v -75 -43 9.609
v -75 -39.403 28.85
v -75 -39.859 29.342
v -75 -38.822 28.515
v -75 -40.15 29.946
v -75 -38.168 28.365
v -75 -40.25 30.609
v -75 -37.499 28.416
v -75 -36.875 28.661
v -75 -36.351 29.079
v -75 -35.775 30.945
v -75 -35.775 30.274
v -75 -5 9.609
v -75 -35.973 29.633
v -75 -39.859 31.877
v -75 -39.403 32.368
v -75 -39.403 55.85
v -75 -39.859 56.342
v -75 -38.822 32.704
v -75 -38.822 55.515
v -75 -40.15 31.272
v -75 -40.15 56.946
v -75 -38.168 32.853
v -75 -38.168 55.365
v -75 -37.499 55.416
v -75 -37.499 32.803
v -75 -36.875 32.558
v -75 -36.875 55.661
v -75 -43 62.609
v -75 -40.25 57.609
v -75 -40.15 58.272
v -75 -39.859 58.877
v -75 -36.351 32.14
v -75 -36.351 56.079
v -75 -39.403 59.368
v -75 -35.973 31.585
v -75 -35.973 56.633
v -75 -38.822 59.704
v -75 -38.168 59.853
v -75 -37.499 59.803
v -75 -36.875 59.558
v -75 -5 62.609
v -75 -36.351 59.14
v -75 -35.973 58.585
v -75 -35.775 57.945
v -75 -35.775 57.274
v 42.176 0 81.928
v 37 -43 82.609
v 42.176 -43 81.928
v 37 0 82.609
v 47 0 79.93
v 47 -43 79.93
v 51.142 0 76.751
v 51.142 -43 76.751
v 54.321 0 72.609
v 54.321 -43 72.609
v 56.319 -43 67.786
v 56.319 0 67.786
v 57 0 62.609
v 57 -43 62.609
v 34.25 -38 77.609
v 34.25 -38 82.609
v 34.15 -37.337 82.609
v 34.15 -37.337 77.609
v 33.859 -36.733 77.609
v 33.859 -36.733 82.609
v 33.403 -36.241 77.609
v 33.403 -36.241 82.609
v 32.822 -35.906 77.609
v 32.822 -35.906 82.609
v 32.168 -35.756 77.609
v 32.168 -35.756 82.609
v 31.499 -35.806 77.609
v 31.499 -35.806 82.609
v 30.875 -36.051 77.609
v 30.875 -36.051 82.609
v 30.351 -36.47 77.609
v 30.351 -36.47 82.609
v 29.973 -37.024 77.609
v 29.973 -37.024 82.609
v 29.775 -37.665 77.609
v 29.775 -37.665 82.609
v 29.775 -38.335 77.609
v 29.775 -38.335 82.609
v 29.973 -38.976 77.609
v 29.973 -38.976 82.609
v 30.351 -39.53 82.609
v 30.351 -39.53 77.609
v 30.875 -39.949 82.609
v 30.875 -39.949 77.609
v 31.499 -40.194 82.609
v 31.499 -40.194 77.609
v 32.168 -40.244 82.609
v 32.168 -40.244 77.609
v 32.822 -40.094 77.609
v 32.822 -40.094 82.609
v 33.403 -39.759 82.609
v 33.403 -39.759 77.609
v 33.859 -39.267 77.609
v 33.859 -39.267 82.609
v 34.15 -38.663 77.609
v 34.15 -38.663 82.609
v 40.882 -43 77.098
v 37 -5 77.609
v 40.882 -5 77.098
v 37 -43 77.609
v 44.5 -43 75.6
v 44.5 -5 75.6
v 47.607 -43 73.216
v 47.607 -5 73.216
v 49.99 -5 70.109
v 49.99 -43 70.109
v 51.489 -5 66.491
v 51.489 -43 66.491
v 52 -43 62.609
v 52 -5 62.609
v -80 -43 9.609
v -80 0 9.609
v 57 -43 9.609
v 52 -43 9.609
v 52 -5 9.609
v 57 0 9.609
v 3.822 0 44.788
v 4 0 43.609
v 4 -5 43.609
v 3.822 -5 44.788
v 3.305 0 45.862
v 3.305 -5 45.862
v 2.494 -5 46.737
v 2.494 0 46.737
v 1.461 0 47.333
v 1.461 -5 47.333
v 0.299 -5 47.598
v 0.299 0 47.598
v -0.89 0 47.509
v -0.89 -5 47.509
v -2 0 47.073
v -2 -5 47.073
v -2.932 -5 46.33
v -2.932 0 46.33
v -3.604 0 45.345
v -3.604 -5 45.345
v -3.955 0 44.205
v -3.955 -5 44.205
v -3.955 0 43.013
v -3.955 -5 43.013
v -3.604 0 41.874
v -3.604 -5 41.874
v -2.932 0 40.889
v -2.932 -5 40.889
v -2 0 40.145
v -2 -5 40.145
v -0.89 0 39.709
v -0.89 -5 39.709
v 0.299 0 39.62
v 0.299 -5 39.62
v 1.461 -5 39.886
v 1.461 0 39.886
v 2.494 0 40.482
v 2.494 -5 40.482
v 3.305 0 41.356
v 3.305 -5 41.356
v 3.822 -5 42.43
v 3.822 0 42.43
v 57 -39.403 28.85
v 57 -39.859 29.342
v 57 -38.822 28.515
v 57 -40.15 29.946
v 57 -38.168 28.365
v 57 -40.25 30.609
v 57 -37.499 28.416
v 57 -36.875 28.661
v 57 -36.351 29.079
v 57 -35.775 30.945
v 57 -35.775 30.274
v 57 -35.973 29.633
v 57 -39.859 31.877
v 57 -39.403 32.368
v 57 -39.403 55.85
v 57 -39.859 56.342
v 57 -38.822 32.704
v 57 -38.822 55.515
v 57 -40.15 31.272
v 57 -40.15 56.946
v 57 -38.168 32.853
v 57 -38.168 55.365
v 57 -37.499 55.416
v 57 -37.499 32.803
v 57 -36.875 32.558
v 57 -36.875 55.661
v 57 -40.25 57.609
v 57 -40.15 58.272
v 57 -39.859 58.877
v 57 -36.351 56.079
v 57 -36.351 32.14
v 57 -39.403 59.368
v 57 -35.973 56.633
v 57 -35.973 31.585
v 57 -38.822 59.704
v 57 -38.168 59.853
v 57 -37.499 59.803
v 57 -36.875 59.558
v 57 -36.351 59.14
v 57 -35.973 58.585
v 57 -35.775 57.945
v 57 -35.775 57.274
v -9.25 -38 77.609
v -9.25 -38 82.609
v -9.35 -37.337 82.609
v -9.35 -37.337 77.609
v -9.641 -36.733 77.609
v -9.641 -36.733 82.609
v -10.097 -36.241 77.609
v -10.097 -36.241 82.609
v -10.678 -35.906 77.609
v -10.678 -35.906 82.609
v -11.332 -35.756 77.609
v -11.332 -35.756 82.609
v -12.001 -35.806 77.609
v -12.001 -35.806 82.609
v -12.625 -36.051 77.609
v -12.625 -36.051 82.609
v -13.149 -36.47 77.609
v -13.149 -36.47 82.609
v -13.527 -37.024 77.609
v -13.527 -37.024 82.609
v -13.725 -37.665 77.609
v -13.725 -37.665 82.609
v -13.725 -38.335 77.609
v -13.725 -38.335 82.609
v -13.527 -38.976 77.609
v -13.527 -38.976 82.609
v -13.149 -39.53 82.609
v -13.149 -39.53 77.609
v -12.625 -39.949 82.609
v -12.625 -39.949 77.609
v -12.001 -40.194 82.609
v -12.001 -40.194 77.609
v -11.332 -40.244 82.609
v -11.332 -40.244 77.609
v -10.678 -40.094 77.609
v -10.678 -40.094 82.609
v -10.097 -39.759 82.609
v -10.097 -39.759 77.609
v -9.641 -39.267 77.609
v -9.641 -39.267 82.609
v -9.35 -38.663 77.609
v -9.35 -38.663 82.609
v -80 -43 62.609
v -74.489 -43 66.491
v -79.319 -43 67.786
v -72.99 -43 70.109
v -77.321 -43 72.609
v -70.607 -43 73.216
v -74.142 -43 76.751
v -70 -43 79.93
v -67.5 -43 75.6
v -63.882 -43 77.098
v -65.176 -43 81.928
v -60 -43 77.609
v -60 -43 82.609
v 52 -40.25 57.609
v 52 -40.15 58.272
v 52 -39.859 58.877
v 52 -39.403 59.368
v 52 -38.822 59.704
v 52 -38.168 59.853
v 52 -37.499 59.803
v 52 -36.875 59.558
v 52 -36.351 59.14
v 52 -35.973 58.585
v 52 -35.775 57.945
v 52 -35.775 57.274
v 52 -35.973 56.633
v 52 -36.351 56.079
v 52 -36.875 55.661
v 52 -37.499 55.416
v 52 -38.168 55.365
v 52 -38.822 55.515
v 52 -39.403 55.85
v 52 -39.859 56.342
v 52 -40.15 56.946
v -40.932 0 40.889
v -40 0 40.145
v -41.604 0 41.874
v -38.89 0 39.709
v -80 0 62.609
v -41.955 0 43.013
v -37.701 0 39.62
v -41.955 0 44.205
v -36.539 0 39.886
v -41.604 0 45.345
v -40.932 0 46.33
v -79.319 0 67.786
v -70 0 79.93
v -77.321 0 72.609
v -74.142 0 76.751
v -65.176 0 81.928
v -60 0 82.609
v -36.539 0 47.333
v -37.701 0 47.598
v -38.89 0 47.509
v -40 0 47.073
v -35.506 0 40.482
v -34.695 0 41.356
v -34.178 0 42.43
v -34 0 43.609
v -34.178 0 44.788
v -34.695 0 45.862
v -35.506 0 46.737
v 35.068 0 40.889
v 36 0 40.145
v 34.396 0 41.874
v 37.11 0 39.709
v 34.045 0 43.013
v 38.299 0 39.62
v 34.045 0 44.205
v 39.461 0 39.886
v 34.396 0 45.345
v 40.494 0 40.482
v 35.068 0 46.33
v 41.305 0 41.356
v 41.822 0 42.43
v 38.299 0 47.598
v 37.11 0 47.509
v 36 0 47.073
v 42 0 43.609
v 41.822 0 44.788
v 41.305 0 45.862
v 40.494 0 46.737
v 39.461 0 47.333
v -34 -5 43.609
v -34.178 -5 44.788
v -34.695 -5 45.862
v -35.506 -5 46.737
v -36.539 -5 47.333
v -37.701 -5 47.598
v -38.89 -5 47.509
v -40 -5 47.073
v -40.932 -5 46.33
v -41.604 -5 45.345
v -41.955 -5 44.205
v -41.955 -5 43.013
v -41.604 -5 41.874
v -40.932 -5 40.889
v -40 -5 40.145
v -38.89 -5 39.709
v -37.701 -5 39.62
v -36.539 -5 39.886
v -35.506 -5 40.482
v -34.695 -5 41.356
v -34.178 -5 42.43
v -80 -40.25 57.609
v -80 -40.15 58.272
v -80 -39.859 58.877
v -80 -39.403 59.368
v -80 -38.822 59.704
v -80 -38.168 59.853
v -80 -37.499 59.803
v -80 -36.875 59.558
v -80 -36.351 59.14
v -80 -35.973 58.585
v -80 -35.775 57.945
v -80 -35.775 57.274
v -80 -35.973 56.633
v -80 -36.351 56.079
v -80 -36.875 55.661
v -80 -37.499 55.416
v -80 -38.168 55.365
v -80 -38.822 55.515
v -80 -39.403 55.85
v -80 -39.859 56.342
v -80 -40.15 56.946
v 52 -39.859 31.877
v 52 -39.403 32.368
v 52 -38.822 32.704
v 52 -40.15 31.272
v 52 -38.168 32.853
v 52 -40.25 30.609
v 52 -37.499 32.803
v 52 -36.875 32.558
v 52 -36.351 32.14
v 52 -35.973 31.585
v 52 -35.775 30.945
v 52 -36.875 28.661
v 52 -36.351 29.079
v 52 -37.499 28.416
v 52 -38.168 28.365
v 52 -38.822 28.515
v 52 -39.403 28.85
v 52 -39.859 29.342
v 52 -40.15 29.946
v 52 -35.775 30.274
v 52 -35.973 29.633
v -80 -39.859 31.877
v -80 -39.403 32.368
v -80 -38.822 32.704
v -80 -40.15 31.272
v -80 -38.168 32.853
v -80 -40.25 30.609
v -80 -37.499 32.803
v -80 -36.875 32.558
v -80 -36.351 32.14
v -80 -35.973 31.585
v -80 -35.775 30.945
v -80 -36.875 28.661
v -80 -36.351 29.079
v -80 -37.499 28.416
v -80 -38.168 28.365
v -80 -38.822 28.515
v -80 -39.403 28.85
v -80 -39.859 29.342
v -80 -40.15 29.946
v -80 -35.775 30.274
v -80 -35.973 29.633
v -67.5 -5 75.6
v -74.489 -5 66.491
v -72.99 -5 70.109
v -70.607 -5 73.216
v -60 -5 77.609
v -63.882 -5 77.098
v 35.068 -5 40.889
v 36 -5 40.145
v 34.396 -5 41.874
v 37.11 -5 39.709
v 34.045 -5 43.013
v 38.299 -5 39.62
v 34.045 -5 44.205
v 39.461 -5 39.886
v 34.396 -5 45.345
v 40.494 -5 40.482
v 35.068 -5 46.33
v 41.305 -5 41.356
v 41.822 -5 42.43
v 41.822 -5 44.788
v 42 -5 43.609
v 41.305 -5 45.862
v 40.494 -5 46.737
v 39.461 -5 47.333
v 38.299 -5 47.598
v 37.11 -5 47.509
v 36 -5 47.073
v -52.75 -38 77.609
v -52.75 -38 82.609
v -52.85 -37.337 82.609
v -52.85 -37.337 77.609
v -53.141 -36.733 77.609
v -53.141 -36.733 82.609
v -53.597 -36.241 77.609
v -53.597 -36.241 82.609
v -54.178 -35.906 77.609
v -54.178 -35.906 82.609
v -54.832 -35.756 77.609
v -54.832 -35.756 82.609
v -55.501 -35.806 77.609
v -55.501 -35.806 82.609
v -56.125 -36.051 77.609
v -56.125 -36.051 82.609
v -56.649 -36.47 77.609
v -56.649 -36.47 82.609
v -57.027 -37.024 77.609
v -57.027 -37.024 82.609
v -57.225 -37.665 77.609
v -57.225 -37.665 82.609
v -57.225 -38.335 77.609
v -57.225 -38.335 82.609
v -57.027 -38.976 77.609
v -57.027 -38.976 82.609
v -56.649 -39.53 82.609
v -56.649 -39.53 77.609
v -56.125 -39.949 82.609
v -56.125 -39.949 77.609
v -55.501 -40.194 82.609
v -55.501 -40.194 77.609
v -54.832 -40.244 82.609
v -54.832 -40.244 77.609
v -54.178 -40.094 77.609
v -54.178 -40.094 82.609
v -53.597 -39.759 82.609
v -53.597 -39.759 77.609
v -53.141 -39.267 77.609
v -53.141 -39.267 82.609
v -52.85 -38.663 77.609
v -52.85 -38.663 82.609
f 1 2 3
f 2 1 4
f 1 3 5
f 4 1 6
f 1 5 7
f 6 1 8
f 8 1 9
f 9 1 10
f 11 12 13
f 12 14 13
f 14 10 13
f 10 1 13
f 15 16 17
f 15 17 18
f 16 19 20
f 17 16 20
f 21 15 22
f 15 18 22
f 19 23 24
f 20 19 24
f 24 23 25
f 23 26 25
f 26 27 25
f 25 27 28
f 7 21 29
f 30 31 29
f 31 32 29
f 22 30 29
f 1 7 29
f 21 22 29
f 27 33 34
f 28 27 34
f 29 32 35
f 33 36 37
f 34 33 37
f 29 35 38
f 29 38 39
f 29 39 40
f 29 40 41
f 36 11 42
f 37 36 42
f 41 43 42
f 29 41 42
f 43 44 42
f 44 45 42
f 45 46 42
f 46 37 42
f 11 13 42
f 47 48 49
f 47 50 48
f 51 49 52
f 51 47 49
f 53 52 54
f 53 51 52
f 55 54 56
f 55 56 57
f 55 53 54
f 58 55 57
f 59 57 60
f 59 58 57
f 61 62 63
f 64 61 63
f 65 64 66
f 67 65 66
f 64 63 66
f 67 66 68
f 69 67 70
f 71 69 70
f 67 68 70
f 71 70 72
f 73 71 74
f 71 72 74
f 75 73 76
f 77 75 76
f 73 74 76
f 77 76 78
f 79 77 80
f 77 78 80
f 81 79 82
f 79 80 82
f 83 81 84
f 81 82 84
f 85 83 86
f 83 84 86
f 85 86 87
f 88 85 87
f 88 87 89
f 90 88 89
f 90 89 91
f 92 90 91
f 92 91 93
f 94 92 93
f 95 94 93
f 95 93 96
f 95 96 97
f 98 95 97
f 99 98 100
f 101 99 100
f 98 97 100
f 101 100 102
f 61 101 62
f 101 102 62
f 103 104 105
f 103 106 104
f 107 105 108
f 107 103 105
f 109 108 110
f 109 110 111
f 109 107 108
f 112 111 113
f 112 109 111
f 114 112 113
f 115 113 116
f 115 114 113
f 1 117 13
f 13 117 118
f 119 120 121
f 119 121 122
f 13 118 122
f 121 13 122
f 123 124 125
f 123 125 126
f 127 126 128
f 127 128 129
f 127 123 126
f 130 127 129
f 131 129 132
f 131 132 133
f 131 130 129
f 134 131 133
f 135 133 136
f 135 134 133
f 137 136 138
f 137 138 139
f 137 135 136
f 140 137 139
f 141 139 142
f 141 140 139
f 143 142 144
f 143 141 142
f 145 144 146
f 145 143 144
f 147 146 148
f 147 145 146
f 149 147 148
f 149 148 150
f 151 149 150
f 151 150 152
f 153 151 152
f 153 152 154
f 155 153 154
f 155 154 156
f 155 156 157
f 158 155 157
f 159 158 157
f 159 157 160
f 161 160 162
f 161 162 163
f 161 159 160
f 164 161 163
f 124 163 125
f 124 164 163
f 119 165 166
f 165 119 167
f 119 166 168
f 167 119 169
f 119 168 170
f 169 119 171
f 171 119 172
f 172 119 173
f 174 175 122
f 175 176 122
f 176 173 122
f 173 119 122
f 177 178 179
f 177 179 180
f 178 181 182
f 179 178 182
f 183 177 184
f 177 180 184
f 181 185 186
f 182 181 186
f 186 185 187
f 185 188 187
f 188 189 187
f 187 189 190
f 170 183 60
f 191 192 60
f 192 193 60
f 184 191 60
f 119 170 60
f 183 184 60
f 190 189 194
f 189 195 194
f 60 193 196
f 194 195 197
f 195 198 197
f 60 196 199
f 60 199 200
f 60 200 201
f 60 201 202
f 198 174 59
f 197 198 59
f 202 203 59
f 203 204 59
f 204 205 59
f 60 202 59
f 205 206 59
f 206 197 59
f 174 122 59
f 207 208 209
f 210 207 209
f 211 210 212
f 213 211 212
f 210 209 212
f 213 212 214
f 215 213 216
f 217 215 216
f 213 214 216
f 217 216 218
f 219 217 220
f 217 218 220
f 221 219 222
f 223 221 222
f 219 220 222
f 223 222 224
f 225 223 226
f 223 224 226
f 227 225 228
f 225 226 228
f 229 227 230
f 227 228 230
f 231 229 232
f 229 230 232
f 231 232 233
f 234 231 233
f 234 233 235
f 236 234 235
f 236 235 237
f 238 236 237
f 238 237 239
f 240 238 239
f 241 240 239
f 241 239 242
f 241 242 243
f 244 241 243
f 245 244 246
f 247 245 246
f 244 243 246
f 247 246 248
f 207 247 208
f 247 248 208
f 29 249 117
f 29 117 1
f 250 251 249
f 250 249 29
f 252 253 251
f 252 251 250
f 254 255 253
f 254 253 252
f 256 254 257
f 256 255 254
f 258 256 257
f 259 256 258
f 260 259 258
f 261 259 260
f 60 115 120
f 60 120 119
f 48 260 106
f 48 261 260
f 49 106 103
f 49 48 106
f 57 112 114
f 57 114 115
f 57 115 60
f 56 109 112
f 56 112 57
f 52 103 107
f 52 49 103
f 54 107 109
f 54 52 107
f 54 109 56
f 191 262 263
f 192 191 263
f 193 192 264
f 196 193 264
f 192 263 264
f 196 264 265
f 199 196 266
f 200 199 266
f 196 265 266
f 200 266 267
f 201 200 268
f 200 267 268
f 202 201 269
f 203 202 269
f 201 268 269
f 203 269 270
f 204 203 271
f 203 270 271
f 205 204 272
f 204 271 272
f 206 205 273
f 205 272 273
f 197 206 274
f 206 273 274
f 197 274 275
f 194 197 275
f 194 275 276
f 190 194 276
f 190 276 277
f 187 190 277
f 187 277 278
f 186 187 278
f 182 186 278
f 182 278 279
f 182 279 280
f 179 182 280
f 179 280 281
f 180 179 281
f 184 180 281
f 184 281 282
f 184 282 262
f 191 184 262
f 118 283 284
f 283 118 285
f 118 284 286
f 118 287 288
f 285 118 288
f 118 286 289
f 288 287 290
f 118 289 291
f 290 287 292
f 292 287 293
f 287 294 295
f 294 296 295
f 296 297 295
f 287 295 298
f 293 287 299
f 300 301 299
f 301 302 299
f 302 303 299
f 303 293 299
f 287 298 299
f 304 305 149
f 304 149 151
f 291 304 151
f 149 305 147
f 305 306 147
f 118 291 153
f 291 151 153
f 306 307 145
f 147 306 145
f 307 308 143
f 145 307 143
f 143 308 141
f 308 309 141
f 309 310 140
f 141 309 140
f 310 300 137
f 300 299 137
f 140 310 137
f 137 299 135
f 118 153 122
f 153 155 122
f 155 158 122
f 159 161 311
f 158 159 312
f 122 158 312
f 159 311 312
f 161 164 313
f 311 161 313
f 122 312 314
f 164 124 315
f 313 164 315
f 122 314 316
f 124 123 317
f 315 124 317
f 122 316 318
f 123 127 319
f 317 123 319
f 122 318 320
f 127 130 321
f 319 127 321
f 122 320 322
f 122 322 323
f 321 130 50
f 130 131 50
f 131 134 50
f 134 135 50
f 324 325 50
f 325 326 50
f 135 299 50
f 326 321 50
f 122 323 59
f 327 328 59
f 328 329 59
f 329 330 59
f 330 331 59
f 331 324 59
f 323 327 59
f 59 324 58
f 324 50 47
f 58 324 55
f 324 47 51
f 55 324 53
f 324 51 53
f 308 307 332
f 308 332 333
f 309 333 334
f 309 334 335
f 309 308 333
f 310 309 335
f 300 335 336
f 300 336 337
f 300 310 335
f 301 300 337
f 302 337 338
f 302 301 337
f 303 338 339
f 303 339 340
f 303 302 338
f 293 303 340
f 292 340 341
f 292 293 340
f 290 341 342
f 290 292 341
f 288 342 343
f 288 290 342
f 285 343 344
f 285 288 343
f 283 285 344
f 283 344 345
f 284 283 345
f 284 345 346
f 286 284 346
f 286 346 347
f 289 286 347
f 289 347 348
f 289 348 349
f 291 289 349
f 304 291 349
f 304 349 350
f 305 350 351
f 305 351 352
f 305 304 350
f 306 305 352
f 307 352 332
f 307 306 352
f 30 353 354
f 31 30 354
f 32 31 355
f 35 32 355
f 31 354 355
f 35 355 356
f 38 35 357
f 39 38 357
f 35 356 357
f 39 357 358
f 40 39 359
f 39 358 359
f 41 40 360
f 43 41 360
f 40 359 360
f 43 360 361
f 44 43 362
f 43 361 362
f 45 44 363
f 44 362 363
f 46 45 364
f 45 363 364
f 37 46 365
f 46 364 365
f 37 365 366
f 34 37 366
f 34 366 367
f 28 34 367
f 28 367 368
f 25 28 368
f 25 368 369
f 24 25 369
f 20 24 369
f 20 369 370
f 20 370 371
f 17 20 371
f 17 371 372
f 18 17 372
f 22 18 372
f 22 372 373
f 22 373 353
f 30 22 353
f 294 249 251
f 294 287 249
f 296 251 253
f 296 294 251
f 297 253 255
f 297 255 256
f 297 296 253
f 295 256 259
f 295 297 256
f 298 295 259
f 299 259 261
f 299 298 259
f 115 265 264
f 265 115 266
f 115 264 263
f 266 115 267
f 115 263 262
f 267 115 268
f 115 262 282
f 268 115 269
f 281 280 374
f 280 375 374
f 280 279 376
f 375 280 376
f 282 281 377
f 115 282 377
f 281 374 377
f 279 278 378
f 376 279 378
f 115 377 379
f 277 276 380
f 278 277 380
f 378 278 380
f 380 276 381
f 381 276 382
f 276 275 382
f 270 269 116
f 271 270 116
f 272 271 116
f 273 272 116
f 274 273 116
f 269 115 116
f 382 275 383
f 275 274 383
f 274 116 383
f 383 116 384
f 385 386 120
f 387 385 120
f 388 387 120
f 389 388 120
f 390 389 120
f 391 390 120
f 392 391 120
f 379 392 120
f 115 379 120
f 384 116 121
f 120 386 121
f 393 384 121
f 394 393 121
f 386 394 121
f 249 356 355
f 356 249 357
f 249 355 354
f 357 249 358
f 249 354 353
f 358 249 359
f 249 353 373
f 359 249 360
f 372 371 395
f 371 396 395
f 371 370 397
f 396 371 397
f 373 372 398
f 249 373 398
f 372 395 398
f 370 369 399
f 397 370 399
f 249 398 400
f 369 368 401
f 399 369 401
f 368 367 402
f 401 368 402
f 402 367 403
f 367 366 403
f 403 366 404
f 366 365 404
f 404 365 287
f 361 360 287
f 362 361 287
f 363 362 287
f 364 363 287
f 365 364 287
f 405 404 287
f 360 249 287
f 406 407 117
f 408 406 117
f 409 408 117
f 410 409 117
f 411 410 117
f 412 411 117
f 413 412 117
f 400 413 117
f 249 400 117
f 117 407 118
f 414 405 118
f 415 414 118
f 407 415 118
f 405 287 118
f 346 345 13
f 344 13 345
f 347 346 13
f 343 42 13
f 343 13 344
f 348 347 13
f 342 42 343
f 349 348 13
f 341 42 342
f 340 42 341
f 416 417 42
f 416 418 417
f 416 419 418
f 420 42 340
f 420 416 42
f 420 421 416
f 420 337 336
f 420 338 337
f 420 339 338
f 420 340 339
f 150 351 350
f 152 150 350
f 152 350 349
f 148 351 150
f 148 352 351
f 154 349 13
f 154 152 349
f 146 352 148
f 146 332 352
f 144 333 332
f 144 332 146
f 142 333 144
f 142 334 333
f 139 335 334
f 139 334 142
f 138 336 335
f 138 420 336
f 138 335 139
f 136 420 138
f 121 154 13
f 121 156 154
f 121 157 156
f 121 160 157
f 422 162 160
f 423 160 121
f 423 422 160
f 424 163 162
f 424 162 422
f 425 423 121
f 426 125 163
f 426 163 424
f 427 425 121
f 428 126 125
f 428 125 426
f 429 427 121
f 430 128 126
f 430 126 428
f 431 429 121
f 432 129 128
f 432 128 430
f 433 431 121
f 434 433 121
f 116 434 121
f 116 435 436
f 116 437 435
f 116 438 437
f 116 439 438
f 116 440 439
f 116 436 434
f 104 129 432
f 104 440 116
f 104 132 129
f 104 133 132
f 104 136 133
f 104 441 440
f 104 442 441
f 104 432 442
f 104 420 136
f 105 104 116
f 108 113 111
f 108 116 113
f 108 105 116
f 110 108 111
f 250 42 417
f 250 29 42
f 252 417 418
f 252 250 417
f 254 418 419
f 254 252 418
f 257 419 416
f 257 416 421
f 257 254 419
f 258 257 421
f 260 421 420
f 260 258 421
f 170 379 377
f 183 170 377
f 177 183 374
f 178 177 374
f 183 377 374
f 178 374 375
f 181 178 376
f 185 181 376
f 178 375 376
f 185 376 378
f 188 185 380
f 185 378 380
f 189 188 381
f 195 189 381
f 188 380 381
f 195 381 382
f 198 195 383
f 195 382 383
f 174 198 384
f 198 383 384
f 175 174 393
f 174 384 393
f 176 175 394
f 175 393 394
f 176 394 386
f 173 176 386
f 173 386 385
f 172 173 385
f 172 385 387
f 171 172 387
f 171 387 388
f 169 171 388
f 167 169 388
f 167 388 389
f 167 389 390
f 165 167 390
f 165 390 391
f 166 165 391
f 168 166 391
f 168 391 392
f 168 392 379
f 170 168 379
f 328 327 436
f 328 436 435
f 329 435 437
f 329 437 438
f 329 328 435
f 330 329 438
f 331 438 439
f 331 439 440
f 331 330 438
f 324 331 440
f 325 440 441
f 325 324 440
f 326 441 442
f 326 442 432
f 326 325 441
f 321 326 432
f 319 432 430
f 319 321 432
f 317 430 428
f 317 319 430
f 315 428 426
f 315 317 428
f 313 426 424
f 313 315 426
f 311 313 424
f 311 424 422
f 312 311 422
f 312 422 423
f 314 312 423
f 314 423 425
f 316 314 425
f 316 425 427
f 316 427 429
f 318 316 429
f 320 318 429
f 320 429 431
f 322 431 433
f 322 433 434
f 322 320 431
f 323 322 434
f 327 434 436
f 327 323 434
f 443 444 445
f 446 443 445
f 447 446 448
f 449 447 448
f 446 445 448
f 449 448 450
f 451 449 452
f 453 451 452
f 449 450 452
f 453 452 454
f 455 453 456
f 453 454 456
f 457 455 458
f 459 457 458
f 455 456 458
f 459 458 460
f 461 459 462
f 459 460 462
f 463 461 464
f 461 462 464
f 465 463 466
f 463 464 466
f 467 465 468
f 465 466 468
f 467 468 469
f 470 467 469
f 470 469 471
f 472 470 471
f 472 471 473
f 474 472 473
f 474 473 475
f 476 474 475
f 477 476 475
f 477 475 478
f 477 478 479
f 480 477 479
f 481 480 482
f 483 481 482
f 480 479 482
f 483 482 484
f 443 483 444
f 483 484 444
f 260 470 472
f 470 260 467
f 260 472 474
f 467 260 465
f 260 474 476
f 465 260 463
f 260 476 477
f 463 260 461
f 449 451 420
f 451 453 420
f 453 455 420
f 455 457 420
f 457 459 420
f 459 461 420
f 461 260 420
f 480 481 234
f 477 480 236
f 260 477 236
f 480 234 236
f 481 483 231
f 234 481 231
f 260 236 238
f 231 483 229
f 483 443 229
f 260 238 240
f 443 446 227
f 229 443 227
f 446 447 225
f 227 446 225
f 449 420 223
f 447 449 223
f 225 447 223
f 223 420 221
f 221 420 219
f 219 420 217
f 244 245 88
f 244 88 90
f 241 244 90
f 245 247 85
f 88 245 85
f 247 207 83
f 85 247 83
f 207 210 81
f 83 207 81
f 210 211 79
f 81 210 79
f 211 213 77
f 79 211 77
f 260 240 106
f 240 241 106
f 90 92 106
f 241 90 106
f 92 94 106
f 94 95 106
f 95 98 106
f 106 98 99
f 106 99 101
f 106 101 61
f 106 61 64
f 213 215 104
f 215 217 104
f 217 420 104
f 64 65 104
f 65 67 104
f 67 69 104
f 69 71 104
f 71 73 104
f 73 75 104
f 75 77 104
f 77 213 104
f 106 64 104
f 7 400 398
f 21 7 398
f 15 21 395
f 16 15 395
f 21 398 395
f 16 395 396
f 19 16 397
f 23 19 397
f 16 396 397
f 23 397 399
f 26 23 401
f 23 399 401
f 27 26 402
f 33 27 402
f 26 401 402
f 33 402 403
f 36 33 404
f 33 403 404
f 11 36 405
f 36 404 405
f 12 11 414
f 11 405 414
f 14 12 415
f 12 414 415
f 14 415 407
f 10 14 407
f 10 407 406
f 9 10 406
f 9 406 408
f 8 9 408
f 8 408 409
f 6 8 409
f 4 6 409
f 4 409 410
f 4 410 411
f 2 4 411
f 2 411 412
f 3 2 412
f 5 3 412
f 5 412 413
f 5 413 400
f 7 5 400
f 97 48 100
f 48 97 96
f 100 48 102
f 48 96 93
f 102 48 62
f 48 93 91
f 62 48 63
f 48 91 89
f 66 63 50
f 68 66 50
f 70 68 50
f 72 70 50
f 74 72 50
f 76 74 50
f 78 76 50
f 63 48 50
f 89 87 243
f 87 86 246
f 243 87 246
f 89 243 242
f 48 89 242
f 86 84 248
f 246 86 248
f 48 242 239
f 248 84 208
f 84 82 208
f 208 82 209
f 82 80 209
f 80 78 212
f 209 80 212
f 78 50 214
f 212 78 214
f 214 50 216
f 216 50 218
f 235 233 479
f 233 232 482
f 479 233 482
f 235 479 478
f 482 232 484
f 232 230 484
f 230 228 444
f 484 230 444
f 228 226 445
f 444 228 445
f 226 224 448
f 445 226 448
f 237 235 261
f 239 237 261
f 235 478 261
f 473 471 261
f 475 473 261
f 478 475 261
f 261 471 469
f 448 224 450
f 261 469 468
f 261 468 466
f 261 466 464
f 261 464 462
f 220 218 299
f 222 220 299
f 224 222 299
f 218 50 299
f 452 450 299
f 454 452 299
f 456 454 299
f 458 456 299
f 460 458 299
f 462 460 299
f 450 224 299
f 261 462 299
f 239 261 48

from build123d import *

# Parameters (mm, degrees)
F0_W     = 137
F0_H     = 73
F0_R     = 4
F1_DEPTH = 5
F3_DEPTH = 38
F5_R     = 2.25
F6_DEPTH = 137.001
F7_R     = 2.25
F8_DEPTH = 5
F9_R     = 15
F10_R    = 20


with BuildPart() as f1:
    # F0 (on Front) → F1 (new body)
    with BuildSketch(Plane.XZ):
        with Locations((-11.5, 46.109202)):
            Rectangle(F0_W, F0_H)
        with Locations((-38, 43.609202)):
            Circle(F0_R, mode=Mode.SUBTRACT)
        with Locations((0, 43.609202)):
            Circle(F0_R, mode=Mode.SUBTRACT)
        with Locations((38, 43.609202)):
            Circle(F0_R, mode=Mode.SUBTRACT)
    extrude(amount=F1_DEPTH)

    # F2 (on face) → F3 (join)
    with BuildSketch(Plane.XZ.offset(5)):
        Polygon((-80, 82.609202), (-80, 9.609202), (-75, 9.609202), (-75, 34.583051), (-75, 77.609202), (52, 77.609202), (52, 9.609202), (57, 9.609202), (57, 82.609202), align=None)
    extrude(amount=F3_DEPTH)

    # F5 (on face) → F6 (cut, through all)
    with BuildSketch(Plane(origin=(-80, 0, 0), x_dir=(0, -1, 0), z_dir=(-1, 0, 0))):
        with Locations((38, 57.609202)):
            Circle(F5_R)
        with Locations((38, 30.609202)):
            Circle(F5_R)
    extrude(amount=-F6_DEPTH, mode=Mode.SUBTRACT)

    # F7 (on face) → F8 (cut, through all)
    with BuildSketch(Plane.XY.offset(82.609202)):
        with Locations((-55, -38)):
            Circle(F7_R)
        with Locations((-11.5, -38)):
            Circle(F7_R)
        with Locations((32, -38)):
            Circle(F7_R)
    extrude(amount=-F8_DEPTH, mode=Mode.SUBTRACT)

    # F9
    f9_edges = [f1.edges().sort_by_distance(p)[0] for p in [
        (-75, -24, 77.609202),
        (52, -24, 77.609202),
    ]]
    fillet(f9_edges, radius=F9_R)

    # F10
    f10_edges = [f1.edges().sort_by_distance(p)[0] for p in [
        (-80, -21.5, 82.609202),
        (57, -21.5, 82.609202),
    ]]
    fillet(f10_edges, radius=F10_R)


solid = f1.part
